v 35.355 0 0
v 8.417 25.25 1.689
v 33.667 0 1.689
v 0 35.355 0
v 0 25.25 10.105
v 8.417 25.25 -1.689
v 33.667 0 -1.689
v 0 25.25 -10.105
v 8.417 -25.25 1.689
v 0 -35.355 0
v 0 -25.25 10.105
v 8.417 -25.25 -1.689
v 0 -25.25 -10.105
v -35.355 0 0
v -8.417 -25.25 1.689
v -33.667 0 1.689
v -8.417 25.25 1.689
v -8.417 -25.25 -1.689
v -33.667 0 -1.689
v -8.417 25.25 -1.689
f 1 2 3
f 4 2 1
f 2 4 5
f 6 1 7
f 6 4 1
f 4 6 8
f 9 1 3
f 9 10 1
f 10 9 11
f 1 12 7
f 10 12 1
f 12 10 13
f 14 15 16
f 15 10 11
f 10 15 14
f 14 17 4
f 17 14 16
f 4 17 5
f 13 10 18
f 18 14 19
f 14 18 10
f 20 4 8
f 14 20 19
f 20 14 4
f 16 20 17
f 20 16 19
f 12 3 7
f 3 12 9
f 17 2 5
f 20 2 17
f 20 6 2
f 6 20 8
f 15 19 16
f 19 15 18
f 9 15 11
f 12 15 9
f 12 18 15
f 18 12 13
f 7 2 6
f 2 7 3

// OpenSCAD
/*
RupertOctahedron

For a polyhedron to be classed as Rupert, it must be possible to cut a hole in it that is large enough for an identical polyhedron to pass through. It sounds impossible, but many polyhedra havethis property, including the octahedron.

This file constructs a octahedron with a hole in it, and a second octahedron of the same size that passes through the hole.

Copyright (C) 2020 Sam Hartburn
This program is free software: you can redistribute it and/or modify
it under the terms of the GNU General Public License as published by
the Free Software Foundation, either version 3 of the License, or
(at your option) any later version.
This program is distributed in the hope that it will be useful,
but WITHOUT ANY WARRANTY; without even the implied warranty of
MERCHANTABILITY or FITNESS FOR A PARTICULAR PURPOSE.  See the
GNU General Public License for more details.
You should have received a copy of the GNU General Public License
along with this program.  If not, see <https://www.gnu.org/licenses/>.
author: Sam Hartburn
email: sam@samhartburn.co.uk
website: www.samhartburn.co.uk
*/

/*
To animate the octahedron passing through the hole, select View->Animate to show the animation settings. Set show_outer and show_unmodified to 1, and show_inner to 0. Enter values in FPS and Steps. I suggest FPS = 30 and Steps = 150.
*/

show_outer=1;
show_inner=0;
show_unmodified=0;

edge_length=50;

//This is what is left of the octahedron after the hole is made
if (show_outer==1) {
    color("DeepSkyBlue") {
        difference() {  
            //This is the octahedron with the hole in it
            octahedron(edge_length);

            //This is the tunnel
            //Made using a projection of the rotated octahedron
            translate([0,0,-edge_length]) {
                linear_extrude(edge_length*2) {
                    projection() {
                        octa2(edge_length*1.01);
                    }
                }
            }
        }
    }
}

//This is piece that is cut out when the hole is made
if (show_inner==1) {
    color("DeepSkyBlue") {
        intersection() {  
            //This is the octahedron with the hole in it
            octahedron(edge_length);

            //This is the tunnel
            //Made using a projection of the rotated octahedron
            translate([0,0,-edge_length]) {
                linear_extrude(edge_length*2) {
                    projection() {
                        octa2(edge_length);
                    }
                }
            }
        }
    }
}

//This is the octahedron rotated to pass through the tunnel
if (show_unmodified==1) {
    color("OrangeRed") {
        translate([0,0,-edge_length*2*$t]) {
            translate([0,0,edge_length*1]) {
                octa2(edge_length);
            }
        }
    }
}

//Function to construct an octahedron
module octahedron(edge) {
    
    coord=edge/sqrt(2);  
       
    points=[[coord,0,0], [-coord,0,0], [0,coord,0], [0,-coord,0], [0,0,coord], [0,0,-coord]];
    
    faces=[[0,4,2],[3,4,0],[1,4,3],[2,4,1],[3,5,1],[1,5,2],[2,5,0],[0,5,3]];
    
    polyhedron(points,faces);
}

//Function to construct a octahedron with the required rotation to pass though the hole
module octa2(edge) {
    
    rotate([0,acos(1/sqrt(3))-acos(sqrt(2/3)),0]) {
        rotate([45,0,0]) {
            octahedron(edge);
        }
    }
    
}
